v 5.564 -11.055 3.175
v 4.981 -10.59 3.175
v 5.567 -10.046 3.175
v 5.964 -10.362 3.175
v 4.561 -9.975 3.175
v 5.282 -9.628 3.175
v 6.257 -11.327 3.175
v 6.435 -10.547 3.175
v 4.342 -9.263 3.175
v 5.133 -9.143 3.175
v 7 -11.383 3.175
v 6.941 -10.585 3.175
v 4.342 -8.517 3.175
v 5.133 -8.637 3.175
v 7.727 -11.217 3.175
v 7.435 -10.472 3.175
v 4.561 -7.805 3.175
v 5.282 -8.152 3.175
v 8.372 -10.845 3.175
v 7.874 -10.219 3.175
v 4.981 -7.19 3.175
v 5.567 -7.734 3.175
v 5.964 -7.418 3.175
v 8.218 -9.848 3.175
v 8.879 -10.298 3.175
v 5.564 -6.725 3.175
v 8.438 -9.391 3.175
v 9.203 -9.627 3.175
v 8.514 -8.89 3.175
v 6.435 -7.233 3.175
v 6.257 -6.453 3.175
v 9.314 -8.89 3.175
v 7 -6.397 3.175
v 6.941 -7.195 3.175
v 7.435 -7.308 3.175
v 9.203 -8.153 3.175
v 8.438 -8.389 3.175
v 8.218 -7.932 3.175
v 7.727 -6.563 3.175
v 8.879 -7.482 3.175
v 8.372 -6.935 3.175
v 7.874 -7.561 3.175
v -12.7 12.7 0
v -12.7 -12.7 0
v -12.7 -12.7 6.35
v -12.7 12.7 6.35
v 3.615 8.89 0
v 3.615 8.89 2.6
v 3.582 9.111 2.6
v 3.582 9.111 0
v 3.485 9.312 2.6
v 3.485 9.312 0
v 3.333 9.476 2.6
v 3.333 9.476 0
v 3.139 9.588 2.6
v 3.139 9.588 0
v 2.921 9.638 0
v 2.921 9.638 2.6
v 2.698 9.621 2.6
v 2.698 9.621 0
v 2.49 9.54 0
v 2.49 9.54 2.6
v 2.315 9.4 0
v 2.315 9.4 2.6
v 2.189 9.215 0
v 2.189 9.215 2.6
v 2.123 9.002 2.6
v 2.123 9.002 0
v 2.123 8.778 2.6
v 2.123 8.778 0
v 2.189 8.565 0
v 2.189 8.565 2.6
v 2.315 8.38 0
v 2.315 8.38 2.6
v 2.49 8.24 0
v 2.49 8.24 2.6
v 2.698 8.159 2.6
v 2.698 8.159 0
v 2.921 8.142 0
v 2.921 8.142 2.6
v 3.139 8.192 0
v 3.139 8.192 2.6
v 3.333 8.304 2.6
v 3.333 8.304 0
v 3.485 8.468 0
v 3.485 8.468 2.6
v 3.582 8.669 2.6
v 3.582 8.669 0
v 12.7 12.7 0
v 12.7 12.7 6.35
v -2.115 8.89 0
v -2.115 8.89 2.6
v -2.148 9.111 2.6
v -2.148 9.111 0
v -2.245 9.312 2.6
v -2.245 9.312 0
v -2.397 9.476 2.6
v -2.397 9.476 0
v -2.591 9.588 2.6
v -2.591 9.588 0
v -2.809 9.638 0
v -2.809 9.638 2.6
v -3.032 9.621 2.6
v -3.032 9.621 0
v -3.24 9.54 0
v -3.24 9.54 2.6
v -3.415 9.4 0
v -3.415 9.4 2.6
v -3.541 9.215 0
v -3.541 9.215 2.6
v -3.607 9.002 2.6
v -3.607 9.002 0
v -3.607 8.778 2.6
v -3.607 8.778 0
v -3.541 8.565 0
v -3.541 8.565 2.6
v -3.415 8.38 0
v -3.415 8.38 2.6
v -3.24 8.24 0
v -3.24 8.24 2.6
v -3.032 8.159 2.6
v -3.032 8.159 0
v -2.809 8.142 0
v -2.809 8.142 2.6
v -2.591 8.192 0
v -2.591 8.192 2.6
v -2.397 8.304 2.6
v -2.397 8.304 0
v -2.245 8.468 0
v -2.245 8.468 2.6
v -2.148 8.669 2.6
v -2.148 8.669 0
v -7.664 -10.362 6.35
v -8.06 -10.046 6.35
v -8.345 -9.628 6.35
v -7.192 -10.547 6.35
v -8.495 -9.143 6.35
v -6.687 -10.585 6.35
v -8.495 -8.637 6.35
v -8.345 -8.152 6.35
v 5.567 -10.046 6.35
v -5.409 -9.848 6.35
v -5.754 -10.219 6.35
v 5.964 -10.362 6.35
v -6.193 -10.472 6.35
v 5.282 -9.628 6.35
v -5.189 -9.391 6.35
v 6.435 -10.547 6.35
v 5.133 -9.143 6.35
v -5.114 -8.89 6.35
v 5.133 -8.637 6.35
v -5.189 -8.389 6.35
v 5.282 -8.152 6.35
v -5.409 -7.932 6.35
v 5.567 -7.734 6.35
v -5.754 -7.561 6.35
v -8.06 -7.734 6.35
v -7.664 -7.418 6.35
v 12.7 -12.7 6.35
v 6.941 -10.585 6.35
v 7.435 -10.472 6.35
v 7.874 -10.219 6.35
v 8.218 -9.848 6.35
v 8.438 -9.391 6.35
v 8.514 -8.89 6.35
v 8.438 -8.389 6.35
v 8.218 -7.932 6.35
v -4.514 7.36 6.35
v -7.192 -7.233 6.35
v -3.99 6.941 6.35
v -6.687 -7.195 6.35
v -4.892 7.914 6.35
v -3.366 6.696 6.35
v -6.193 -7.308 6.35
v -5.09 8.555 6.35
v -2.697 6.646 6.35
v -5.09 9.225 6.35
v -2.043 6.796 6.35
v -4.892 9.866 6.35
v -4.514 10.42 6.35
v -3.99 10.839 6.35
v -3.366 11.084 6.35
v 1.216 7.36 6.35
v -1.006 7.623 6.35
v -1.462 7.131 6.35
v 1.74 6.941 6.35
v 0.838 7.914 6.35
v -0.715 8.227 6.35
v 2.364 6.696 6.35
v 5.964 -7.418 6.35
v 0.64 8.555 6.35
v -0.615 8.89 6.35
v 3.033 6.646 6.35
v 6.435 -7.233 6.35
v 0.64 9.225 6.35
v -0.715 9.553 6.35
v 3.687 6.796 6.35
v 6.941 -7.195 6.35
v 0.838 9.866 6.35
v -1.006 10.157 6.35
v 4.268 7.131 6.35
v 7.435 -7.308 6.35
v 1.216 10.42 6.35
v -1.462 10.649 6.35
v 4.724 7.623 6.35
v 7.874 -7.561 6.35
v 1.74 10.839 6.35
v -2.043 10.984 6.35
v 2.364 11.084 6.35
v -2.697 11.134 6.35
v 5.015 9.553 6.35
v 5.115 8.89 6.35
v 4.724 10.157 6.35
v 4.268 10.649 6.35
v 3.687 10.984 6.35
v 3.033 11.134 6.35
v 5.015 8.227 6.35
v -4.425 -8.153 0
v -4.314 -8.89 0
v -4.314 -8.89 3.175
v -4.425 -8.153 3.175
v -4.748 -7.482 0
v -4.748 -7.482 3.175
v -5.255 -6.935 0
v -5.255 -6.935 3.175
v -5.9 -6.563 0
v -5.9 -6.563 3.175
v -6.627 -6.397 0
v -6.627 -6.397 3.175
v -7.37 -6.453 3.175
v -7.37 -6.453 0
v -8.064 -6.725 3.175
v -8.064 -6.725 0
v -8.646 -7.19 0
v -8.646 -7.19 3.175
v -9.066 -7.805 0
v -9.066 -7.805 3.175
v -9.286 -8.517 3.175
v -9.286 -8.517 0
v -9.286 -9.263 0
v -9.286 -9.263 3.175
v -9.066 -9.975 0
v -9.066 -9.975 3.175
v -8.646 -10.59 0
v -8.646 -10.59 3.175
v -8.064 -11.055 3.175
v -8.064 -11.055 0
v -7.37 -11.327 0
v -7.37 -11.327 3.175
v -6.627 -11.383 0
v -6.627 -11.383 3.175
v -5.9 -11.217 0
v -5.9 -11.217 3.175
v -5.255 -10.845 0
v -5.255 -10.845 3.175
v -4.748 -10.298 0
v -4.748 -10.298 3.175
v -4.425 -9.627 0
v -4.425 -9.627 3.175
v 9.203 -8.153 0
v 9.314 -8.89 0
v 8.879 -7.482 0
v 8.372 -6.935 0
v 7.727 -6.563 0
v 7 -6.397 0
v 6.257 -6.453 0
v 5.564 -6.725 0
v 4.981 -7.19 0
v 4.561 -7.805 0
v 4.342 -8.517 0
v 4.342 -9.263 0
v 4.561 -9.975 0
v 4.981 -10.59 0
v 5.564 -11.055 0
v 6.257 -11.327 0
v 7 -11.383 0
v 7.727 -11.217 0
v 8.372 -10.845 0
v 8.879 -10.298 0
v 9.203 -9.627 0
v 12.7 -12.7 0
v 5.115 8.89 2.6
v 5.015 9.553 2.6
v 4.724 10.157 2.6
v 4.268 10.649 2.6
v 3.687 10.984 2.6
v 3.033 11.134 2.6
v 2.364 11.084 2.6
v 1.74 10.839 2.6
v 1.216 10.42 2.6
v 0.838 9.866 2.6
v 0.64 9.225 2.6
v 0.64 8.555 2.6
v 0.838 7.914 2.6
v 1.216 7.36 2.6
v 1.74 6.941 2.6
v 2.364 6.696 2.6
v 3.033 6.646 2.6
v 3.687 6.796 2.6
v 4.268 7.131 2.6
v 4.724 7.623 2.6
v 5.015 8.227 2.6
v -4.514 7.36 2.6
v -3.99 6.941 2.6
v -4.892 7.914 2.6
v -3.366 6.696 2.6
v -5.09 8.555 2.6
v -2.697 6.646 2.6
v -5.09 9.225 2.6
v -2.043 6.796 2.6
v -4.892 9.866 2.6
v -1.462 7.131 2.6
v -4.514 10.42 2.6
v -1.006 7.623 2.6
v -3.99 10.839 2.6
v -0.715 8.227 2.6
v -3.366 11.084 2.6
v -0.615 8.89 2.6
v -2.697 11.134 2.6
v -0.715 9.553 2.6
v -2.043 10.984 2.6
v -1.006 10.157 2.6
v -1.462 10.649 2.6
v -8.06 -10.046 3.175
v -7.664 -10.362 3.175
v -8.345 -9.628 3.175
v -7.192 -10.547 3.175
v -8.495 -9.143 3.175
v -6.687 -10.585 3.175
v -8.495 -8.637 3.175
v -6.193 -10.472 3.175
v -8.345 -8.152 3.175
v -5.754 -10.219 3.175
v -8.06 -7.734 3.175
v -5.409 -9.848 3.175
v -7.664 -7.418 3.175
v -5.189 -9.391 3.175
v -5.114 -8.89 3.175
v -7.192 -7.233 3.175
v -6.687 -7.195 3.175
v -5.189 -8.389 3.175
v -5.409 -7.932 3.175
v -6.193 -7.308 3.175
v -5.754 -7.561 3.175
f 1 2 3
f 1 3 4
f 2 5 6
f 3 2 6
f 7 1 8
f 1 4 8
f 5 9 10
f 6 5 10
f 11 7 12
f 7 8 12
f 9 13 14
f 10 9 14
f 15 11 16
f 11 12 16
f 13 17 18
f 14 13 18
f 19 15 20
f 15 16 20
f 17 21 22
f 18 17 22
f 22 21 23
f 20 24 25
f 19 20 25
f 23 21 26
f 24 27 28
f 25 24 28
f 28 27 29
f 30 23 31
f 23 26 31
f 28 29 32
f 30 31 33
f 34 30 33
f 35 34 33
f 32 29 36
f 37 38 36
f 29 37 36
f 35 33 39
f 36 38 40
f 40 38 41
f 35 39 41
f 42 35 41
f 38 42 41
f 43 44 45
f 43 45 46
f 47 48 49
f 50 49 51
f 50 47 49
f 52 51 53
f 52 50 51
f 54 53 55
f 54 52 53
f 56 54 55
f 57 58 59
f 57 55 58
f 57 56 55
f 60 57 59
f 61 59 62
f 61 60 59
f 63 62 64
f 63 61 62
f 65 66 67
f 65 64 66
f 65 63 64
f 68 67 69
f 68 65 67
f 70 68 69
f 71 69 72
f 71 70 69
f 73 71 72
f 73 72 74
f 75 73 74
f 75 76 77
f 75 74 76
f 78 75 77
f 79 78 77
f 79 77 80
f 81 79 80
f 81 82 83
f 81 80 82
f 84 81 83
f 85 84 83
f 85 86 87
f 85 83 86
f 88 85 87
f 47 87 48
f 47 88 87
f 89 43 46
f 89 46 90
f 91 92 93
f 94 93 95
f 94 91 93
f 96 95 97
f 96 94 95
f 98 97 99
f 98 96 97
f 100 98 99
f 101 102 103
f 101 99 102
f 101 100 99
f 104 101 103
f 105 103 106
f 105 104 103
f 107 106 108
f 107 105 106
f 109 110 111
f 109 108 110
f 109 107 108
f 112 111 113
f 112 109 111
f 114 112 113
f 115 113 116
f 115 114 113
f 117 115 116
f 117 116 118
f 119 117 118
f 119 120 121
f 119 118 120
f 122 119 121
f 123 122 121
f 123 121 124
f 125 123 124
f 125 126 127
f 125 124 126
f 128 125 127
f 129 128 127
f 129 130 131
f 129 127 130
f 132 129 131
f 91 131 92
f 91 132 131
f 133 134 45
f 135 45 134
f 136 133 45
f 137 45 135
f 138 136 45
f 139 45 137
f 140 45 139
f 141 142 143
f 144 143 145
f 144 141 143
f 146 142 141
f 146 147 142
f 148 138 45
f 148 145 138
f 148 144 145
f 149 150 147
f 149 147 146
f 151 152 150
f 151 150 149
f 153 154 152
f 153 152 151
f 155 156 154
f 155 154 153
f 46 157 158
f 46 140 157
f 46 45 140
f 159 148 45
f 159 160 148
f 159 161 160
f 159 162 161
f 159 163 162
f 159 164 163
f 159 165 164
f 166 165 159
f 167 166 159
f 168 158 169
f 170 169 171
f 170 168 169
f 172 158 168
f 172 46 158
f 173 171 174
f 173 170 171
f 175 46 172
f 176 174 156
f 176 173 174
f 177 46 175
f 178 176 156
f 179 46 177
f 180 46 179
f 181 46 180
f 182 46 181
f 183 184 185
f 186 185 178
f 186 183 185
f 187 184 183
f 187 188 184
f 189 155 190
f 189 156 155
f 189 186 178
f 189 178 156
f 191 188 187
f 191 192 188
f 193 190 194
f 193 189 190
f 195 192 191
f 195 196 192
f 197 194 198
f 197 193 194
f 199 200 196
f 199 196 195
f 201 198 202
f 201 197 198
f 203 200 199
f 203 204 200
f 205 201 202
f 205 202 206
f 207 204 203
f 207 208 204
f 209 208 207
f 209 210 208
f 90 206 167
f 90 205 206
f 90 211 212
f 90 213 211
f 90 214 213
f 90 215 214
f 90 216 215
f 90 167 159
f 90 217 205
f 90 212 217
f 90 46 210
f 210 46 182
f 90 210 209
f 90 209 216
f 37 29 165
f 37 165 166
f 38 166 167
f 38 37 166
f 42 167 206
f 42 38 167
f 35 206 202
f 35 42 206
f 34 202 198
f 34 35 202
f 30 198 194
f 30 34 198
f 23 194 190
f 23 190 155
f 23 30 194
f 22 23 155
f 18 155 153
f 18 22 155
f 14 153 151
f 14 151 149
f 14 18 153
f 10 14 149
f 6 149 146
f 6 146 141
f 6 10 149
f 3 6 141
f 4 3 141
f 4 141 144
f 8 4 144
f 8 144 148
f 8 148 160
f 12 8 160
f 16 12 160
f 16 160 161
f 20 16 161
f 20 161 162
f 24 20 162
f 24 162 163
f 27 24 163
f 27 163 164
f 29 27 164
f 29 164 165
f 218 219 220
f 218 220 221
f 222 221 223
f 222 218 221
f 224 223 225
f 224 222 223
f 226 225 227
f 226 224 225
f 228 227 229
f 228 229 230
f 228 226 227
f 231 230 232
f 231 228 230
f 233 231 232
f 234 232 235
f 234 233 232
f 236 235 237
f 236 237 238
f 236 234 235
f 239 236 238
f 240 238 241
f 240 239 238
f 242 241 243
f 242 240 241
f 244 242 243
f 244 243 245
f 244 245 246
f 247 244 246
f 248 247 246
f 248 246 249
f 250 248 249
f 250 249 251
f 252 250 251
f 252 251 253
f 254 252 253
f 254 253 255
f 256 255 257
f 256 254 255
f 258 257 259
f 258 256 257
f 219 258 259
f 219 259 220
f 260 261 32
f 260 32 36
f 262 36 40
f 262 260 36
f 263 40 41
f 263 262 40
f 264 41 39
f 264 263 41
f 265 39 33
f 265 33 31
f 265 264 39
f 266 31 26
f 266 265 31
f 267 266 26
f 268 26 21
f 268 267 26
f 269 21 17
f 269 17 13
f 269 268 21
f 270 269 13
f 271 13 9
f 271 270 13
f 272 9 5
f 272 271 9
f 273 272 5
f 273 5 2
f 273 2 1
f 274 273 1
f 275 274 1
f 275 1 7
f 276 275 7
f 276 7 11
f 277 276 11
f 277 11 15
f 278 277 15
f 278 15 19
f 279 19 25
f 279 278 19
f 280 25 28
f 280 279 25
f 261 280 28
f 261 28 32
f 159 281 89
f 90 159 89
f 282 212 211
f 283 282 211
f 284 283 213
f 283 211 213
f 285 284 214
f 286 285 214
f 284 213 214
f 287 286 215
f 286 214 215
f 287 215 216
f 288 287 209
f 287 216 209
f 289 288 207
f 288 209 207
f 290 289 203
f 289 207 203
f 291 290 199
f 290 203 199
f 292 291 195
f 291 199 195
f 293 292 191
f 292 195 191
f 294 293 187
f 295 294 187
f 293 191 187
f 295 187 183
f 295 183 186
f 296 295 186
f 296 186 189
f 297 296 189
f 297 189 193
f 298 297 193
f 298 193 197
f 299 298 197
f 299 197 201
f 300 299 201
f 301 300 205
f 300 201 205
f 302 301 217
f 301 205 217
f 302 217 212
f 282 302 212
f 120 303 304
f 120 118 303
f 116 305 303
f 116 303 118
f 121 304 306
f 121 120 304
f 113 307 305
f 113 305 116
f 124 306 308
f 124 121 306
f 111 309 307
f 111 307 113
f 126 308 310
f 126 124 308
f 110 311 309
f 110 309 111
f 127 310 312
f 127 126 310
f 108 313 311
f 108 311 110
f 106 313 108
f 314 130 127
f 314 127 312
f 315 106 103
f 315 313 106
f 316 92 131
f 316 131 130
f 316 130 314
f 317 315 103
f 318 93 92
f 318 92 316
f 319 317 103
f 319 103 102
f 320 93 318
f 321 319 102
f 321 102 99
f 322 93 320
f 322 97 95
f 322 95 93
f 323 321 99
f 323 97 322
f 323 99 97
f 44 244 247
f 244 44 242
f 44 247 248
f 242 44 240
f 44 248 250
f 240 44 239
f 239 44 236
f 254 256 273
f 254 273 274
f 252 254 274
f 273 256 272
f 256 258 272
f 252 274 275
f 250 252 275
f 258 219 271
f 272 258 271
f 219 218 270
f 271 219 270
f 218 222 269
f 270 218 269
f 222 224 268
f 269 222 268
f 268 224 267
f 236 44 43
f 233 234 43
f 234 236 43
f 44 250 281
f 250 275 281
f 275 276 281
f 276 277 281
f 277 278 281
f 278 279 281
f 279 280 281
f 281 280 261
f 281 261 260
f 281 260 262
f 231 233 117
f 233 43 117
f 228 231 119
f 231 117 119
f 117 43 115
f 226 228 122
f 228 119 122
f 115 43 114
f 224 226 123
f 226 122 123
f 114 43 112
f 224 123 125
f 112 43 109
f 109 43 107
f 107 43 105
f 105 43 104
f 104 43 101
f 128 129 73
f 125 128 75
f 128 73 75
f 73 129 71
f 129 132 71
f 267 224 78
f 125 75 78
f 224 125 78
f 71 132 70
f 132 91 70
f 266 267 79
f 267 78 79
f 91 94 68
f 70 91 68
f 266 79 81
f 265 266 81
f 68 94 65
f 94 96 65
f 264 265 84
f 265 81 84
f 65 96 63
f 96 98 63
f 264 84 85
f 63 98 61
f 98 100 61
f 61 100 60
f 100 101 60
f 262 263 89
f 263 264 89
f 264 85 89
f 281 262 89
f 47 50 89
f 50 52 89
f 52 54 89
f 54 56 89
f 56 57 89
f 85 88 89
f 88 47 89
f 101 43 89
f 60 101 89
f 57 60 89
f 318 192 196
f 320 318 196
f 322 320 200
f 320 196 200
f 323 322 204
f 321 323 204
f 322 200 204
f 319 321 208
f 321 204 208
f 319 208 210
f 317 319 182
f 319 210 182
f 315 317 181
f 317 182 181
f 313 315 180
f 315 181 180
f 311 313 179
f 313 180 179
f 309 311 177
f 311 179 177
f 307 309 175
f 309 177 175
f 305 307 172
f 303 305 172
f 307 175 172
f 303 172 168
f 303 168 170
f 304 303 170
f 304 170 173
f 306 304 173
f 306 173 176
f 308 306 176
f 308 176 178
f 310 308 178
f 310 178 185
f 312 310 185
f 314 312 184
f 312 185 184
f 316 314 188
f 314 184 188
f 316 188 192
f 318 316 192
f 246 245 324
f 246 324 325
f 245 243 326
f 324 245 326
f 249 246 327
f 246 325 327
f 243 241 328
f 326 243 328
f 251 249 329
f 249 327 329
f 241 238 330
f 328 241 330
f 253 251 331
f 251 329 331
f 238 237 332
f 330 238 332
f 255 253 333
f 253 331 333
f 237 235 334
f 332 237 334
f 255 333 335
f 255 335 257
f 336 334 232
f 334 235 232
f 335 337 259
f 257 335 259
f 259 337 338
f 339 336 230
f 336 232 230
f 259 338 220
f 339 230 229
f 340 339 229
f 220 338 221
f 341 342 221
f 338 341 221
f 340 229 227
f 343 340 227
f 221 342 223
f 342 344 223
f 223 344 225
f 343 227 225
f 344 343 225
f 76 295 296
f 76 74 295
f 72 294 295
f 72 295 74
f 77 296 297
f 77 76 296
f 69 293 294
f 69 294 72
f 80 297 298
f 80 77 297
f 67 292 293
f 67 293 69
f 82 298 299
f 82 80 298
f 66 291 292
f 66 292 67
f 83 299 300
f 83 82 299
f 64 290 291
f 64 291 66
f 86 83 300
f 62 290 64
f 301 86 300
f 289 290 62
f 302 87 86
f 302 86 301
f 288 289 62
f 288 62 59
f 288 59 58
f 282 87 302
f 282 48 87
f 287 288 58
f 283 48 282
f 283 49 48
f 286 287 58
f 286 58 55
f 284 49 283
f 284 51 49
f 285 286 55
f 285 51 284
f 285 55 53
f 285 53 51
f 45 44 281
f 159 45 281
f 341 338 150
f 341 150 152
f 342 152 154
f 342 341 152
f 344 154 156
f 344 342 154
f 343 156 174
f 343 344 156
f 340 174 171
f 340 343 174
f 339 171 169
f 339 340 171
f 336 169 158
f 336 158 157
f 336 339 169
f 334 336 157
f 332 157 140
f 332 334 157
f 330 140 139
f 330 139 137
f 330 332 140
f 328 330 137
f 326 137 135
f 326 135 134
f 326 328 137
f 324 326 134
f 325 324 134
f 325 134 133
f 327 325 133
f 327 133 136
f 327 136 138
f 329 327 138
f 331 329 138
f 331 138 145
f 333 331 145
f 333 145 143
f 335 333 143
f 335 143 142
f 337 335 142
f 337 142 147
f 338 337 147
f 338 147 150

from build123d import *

# Parameters (mm, degrees)
F0_W     = 25.4
F0_H     = 25.4
F0_R     = 1.7
F0_R_2   = 0.75
F1_DEPTH = 6.35
F2_R     = 2.5
F3_DEPTH = 3.175
F4_R     = 2.25
F5_DEPTH = 3.75


# Not quite as in the source:
# - a feature names something its author has since deleted; it is built from what else it names


with BuildPart() as f1:
    # F0 (on Top) → F1 (new body)
    with BuildSketch(Plane.XY):
        Rectangle(F0_W, F0_H)
        with Locations((-6.8136113696, -8.89)):
            Circle(F0_R, mode=Mode.SUBTRACT)
        with Locations((6.8136113696, -8.89)):
            Circle(F0_R, mode=Mode.SUBTRACT)
        with Locations((-2.865, 8.89)):
            Circle(F0_R_2, mode=Mode.SUBTRACT)
        with Locations((2.865, 8.89)):
            Circle(F0_R_2, mode=Mode.SUBTRACT)
    extrude(amount=F1_DEPTH)

    # F2 (on Top) → F3 (cut)
    with BuildSketch(Plane.XY):
        with Locations((-6.8136113696, -8.89)):
            Circle(F2_R)
        with Locations((6.8136113696, -8.89)):
            Circle(F2_R)
    extrude(amount=F3_DEPTH, mode=Mode.SUBTRACT)

    # F4 (on face) → F5 (cut)
    with BuildSketch(Plane.XY.offset(6.35)):
        with Locations((-2.865, 8.89)):
            Circle(F4_R)
        with Locations((2.865, 8.89)):
            Circle(F4_R)
    extrude(amount=-F5_DEPTH, mode=Mode.SUBTRACT)


solid = f1.part
